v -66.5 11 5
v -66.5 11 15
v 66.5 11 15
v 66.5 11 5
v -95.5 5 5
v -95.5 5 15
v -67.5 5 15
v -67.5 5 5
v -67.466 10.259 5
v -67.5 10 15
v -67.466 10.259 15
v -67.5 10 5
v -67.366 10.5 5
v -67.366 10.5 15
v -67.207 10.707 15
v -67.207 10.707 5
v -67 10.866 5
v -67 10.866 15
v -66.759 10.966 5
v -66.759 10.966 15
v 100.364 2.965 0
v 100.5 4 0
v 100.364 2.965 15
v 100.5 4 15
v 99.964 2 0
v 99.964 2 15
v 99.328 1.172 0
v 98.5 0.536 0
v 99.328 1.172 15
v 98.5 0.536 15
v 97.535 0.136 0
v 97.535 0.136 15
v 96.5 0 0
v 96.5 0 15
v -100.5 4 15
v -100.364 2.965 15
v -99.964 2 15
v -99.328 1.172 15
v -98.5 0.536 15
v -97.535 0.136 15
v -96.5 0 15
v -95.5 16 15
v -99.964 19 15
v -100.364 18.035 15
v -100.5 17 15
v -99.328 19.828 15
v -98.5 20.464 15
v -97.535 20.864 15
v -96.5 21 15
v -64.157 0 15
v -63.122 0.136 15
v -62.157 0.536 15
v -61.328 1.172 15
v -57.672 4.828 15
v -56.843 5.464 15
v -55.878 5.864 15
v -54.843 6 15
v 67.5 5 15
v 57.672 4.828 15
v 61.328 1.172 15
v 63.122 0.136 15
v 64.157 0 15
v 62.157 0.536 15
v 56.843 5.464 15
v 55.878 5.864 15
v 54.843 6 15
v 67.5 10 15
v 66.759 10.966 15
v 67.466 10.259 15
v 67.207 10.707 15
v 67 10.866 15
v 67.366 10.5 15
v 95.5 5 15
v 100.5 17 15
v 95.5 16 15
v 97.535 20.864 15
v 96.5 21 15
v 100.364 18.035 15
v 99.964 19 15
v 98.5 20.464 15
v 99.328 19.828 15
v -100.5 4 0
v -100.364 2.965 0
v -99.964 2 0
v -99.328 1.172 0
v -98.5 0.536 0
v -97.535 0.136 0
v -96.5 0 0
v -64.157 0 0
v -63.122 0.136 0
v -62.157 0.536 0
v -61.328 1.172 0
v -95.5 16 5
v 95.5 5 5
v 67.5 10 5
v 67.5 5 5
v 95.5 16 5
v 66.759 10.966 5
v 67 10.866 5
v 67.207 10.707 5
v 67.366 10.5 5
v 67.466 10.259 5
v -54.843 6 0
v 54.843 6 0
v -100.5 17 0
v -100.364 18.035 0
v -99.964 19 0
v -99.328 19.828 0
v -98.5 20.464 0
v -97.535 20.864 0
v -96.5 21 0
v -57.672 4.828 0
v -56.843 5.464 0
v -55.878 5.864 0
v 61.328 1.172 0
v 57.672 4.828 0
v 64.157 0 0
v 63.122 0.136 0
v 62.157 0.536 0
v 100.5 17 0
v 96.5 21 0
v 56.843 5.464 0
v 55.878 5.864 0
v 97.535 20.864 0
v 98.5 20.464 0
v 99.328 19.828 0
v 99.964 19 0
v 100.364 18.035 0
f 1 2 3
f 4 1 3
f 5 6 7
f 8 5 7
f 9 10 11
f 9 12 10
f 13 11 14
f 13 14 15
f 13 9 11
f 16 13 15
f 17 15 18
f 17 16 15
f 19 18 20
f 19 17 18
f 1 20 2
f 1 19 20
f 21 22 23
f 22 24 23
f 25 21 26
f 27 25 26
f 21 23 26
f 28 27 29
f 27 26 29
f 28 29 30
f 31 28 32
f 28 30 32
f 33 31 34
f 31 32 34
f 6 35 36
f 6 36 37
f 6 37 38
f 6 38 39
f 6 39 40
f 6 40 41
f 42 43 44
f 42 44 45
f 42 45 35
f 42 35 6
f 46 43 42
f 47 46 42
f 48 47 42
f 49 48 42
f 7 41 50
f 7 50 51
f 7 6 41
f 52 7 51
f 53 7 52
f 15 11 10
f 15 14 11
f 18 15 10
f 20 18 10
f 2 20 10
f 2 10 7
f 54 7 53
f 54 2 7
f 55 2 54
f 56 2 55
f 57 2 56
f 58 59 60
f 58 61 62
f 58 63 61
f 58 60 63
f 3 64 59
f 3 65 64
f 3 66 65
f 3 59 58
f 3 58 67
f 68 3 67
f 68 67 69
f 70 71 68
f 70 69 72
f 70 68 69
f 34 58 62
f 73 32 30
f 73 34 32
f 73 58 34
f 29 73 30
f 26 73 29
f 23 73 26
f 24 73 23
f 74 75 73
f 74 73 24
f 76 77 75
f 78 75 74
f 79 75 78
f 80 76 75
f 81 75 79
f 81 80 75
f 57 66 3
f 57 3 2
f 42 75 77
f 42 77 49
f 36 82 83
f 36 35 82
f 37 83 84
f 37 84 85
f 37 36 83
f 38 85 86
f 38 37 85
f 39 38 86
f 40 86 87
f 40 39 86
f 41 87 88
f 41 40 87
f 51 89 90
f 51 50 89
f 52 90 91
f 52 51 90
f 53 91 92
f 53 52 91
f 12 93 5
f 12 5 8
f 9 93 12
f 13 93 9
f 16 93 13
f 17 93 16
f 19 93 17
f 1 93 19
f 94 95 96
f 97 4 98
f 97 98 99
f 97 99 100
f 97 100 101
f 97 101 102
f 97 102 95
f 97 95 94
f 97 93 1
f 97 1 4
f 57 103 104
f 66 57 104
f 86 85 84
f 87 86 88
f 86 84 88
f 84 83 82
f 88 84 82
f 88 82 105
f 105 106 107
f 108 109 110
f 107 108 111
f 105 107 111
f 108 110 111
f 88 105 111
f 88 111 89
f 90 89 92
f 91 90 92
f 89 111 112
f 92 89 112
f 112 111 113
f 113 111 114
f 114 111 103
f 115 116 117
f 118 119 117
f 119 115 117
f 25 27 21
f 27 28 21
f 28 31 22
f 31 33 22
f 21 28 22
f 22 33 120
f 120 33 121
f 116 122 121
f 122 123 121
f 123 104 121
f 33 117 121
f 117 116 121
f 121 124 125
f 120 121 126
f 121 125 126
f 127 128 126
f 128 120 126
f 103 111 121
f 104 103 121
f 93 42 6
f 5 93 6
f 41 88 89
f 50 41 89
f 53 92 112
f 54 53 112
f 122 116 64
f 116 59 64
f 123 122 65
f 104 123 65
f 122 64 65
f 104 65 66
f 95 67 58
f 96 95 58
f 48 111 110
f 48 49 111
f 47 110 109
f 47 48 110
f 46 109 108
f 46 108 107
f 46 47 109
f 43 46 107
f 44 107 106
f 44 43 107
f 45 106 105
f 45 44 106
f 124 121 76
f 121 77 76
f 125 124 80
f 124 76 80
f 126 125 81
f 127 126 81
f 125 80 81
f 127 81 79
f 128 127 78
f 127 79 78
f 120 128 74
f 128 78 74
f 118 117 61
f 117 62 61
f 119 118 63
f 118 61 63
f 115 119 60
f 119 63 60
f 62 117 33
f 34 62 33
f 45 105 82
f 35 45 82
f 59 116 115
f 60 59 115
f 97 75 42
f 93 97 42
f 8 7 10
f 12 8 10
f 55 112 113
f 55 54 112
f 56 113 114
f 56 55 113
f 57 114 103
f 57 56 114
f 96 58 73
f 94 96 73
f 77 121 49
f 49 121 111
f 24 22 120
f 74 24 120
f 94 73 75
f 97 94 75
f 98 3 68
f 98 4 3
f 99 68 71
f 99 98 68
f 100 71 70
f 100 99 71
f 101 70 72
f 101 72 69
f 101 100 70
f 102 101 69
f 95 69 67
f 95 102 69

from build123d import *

# Parameters (mm, degrees)
F1_DEPTH = 15
F3_DEPTH = 10
F4_R     = 1
F5_R     = 4


with BuildPart() as f1:
    # F0 (on Top) → F1 (new body)
    with BuildSketch(Plane.XY):
        Polygon((100.5, 21), (-100.5, 21), (-100.5, 0), (-62.5, 0), (-56.5, 6), (56.5, 6), (62.5, 0), (100.5, 0), align=None)
    extrude(amount=F1_DEPTH)

    # F2 (on face) → F3 (cut)
    with BuildSketch(Plane.XY.offset(15)):
        Polygon((95.5, 16), (-95.5, 16), (-95.5, 5), (-67.5, 5), (-67.5, 11), (67.5, 11), (67.5, 5), (95.5, 5), align=None)
    extrude(amount=-F3_DEPTH, mode=Mode.SUBTRACT)

    # F4
    f4_edges = [f1.edges().sort_by_distance(p)[0] for p in [
        (67.5, 11, 10),
        (-67.5, 11, 10),
    ]]
    fillet(f4_edges, radius=F4_R)

    # F5
    f5_edges = [f1.edges().sort_by_distance(p)[0] for p in [
        (-62.5, 0, 7.5),
        (-56.5, 6, 7.5),
        (56.5, 6, 7.5),
        (62.5, 0, 7.5),
        (-100.5, 0, 7.5),
        (-100.5, 21, 7.5),
        (100.5, 21, 7.5),
        (100.5, 0, 7.5),
    ]]
    fillet(f5_edges, radius=F5_R)


solid = f1.part
